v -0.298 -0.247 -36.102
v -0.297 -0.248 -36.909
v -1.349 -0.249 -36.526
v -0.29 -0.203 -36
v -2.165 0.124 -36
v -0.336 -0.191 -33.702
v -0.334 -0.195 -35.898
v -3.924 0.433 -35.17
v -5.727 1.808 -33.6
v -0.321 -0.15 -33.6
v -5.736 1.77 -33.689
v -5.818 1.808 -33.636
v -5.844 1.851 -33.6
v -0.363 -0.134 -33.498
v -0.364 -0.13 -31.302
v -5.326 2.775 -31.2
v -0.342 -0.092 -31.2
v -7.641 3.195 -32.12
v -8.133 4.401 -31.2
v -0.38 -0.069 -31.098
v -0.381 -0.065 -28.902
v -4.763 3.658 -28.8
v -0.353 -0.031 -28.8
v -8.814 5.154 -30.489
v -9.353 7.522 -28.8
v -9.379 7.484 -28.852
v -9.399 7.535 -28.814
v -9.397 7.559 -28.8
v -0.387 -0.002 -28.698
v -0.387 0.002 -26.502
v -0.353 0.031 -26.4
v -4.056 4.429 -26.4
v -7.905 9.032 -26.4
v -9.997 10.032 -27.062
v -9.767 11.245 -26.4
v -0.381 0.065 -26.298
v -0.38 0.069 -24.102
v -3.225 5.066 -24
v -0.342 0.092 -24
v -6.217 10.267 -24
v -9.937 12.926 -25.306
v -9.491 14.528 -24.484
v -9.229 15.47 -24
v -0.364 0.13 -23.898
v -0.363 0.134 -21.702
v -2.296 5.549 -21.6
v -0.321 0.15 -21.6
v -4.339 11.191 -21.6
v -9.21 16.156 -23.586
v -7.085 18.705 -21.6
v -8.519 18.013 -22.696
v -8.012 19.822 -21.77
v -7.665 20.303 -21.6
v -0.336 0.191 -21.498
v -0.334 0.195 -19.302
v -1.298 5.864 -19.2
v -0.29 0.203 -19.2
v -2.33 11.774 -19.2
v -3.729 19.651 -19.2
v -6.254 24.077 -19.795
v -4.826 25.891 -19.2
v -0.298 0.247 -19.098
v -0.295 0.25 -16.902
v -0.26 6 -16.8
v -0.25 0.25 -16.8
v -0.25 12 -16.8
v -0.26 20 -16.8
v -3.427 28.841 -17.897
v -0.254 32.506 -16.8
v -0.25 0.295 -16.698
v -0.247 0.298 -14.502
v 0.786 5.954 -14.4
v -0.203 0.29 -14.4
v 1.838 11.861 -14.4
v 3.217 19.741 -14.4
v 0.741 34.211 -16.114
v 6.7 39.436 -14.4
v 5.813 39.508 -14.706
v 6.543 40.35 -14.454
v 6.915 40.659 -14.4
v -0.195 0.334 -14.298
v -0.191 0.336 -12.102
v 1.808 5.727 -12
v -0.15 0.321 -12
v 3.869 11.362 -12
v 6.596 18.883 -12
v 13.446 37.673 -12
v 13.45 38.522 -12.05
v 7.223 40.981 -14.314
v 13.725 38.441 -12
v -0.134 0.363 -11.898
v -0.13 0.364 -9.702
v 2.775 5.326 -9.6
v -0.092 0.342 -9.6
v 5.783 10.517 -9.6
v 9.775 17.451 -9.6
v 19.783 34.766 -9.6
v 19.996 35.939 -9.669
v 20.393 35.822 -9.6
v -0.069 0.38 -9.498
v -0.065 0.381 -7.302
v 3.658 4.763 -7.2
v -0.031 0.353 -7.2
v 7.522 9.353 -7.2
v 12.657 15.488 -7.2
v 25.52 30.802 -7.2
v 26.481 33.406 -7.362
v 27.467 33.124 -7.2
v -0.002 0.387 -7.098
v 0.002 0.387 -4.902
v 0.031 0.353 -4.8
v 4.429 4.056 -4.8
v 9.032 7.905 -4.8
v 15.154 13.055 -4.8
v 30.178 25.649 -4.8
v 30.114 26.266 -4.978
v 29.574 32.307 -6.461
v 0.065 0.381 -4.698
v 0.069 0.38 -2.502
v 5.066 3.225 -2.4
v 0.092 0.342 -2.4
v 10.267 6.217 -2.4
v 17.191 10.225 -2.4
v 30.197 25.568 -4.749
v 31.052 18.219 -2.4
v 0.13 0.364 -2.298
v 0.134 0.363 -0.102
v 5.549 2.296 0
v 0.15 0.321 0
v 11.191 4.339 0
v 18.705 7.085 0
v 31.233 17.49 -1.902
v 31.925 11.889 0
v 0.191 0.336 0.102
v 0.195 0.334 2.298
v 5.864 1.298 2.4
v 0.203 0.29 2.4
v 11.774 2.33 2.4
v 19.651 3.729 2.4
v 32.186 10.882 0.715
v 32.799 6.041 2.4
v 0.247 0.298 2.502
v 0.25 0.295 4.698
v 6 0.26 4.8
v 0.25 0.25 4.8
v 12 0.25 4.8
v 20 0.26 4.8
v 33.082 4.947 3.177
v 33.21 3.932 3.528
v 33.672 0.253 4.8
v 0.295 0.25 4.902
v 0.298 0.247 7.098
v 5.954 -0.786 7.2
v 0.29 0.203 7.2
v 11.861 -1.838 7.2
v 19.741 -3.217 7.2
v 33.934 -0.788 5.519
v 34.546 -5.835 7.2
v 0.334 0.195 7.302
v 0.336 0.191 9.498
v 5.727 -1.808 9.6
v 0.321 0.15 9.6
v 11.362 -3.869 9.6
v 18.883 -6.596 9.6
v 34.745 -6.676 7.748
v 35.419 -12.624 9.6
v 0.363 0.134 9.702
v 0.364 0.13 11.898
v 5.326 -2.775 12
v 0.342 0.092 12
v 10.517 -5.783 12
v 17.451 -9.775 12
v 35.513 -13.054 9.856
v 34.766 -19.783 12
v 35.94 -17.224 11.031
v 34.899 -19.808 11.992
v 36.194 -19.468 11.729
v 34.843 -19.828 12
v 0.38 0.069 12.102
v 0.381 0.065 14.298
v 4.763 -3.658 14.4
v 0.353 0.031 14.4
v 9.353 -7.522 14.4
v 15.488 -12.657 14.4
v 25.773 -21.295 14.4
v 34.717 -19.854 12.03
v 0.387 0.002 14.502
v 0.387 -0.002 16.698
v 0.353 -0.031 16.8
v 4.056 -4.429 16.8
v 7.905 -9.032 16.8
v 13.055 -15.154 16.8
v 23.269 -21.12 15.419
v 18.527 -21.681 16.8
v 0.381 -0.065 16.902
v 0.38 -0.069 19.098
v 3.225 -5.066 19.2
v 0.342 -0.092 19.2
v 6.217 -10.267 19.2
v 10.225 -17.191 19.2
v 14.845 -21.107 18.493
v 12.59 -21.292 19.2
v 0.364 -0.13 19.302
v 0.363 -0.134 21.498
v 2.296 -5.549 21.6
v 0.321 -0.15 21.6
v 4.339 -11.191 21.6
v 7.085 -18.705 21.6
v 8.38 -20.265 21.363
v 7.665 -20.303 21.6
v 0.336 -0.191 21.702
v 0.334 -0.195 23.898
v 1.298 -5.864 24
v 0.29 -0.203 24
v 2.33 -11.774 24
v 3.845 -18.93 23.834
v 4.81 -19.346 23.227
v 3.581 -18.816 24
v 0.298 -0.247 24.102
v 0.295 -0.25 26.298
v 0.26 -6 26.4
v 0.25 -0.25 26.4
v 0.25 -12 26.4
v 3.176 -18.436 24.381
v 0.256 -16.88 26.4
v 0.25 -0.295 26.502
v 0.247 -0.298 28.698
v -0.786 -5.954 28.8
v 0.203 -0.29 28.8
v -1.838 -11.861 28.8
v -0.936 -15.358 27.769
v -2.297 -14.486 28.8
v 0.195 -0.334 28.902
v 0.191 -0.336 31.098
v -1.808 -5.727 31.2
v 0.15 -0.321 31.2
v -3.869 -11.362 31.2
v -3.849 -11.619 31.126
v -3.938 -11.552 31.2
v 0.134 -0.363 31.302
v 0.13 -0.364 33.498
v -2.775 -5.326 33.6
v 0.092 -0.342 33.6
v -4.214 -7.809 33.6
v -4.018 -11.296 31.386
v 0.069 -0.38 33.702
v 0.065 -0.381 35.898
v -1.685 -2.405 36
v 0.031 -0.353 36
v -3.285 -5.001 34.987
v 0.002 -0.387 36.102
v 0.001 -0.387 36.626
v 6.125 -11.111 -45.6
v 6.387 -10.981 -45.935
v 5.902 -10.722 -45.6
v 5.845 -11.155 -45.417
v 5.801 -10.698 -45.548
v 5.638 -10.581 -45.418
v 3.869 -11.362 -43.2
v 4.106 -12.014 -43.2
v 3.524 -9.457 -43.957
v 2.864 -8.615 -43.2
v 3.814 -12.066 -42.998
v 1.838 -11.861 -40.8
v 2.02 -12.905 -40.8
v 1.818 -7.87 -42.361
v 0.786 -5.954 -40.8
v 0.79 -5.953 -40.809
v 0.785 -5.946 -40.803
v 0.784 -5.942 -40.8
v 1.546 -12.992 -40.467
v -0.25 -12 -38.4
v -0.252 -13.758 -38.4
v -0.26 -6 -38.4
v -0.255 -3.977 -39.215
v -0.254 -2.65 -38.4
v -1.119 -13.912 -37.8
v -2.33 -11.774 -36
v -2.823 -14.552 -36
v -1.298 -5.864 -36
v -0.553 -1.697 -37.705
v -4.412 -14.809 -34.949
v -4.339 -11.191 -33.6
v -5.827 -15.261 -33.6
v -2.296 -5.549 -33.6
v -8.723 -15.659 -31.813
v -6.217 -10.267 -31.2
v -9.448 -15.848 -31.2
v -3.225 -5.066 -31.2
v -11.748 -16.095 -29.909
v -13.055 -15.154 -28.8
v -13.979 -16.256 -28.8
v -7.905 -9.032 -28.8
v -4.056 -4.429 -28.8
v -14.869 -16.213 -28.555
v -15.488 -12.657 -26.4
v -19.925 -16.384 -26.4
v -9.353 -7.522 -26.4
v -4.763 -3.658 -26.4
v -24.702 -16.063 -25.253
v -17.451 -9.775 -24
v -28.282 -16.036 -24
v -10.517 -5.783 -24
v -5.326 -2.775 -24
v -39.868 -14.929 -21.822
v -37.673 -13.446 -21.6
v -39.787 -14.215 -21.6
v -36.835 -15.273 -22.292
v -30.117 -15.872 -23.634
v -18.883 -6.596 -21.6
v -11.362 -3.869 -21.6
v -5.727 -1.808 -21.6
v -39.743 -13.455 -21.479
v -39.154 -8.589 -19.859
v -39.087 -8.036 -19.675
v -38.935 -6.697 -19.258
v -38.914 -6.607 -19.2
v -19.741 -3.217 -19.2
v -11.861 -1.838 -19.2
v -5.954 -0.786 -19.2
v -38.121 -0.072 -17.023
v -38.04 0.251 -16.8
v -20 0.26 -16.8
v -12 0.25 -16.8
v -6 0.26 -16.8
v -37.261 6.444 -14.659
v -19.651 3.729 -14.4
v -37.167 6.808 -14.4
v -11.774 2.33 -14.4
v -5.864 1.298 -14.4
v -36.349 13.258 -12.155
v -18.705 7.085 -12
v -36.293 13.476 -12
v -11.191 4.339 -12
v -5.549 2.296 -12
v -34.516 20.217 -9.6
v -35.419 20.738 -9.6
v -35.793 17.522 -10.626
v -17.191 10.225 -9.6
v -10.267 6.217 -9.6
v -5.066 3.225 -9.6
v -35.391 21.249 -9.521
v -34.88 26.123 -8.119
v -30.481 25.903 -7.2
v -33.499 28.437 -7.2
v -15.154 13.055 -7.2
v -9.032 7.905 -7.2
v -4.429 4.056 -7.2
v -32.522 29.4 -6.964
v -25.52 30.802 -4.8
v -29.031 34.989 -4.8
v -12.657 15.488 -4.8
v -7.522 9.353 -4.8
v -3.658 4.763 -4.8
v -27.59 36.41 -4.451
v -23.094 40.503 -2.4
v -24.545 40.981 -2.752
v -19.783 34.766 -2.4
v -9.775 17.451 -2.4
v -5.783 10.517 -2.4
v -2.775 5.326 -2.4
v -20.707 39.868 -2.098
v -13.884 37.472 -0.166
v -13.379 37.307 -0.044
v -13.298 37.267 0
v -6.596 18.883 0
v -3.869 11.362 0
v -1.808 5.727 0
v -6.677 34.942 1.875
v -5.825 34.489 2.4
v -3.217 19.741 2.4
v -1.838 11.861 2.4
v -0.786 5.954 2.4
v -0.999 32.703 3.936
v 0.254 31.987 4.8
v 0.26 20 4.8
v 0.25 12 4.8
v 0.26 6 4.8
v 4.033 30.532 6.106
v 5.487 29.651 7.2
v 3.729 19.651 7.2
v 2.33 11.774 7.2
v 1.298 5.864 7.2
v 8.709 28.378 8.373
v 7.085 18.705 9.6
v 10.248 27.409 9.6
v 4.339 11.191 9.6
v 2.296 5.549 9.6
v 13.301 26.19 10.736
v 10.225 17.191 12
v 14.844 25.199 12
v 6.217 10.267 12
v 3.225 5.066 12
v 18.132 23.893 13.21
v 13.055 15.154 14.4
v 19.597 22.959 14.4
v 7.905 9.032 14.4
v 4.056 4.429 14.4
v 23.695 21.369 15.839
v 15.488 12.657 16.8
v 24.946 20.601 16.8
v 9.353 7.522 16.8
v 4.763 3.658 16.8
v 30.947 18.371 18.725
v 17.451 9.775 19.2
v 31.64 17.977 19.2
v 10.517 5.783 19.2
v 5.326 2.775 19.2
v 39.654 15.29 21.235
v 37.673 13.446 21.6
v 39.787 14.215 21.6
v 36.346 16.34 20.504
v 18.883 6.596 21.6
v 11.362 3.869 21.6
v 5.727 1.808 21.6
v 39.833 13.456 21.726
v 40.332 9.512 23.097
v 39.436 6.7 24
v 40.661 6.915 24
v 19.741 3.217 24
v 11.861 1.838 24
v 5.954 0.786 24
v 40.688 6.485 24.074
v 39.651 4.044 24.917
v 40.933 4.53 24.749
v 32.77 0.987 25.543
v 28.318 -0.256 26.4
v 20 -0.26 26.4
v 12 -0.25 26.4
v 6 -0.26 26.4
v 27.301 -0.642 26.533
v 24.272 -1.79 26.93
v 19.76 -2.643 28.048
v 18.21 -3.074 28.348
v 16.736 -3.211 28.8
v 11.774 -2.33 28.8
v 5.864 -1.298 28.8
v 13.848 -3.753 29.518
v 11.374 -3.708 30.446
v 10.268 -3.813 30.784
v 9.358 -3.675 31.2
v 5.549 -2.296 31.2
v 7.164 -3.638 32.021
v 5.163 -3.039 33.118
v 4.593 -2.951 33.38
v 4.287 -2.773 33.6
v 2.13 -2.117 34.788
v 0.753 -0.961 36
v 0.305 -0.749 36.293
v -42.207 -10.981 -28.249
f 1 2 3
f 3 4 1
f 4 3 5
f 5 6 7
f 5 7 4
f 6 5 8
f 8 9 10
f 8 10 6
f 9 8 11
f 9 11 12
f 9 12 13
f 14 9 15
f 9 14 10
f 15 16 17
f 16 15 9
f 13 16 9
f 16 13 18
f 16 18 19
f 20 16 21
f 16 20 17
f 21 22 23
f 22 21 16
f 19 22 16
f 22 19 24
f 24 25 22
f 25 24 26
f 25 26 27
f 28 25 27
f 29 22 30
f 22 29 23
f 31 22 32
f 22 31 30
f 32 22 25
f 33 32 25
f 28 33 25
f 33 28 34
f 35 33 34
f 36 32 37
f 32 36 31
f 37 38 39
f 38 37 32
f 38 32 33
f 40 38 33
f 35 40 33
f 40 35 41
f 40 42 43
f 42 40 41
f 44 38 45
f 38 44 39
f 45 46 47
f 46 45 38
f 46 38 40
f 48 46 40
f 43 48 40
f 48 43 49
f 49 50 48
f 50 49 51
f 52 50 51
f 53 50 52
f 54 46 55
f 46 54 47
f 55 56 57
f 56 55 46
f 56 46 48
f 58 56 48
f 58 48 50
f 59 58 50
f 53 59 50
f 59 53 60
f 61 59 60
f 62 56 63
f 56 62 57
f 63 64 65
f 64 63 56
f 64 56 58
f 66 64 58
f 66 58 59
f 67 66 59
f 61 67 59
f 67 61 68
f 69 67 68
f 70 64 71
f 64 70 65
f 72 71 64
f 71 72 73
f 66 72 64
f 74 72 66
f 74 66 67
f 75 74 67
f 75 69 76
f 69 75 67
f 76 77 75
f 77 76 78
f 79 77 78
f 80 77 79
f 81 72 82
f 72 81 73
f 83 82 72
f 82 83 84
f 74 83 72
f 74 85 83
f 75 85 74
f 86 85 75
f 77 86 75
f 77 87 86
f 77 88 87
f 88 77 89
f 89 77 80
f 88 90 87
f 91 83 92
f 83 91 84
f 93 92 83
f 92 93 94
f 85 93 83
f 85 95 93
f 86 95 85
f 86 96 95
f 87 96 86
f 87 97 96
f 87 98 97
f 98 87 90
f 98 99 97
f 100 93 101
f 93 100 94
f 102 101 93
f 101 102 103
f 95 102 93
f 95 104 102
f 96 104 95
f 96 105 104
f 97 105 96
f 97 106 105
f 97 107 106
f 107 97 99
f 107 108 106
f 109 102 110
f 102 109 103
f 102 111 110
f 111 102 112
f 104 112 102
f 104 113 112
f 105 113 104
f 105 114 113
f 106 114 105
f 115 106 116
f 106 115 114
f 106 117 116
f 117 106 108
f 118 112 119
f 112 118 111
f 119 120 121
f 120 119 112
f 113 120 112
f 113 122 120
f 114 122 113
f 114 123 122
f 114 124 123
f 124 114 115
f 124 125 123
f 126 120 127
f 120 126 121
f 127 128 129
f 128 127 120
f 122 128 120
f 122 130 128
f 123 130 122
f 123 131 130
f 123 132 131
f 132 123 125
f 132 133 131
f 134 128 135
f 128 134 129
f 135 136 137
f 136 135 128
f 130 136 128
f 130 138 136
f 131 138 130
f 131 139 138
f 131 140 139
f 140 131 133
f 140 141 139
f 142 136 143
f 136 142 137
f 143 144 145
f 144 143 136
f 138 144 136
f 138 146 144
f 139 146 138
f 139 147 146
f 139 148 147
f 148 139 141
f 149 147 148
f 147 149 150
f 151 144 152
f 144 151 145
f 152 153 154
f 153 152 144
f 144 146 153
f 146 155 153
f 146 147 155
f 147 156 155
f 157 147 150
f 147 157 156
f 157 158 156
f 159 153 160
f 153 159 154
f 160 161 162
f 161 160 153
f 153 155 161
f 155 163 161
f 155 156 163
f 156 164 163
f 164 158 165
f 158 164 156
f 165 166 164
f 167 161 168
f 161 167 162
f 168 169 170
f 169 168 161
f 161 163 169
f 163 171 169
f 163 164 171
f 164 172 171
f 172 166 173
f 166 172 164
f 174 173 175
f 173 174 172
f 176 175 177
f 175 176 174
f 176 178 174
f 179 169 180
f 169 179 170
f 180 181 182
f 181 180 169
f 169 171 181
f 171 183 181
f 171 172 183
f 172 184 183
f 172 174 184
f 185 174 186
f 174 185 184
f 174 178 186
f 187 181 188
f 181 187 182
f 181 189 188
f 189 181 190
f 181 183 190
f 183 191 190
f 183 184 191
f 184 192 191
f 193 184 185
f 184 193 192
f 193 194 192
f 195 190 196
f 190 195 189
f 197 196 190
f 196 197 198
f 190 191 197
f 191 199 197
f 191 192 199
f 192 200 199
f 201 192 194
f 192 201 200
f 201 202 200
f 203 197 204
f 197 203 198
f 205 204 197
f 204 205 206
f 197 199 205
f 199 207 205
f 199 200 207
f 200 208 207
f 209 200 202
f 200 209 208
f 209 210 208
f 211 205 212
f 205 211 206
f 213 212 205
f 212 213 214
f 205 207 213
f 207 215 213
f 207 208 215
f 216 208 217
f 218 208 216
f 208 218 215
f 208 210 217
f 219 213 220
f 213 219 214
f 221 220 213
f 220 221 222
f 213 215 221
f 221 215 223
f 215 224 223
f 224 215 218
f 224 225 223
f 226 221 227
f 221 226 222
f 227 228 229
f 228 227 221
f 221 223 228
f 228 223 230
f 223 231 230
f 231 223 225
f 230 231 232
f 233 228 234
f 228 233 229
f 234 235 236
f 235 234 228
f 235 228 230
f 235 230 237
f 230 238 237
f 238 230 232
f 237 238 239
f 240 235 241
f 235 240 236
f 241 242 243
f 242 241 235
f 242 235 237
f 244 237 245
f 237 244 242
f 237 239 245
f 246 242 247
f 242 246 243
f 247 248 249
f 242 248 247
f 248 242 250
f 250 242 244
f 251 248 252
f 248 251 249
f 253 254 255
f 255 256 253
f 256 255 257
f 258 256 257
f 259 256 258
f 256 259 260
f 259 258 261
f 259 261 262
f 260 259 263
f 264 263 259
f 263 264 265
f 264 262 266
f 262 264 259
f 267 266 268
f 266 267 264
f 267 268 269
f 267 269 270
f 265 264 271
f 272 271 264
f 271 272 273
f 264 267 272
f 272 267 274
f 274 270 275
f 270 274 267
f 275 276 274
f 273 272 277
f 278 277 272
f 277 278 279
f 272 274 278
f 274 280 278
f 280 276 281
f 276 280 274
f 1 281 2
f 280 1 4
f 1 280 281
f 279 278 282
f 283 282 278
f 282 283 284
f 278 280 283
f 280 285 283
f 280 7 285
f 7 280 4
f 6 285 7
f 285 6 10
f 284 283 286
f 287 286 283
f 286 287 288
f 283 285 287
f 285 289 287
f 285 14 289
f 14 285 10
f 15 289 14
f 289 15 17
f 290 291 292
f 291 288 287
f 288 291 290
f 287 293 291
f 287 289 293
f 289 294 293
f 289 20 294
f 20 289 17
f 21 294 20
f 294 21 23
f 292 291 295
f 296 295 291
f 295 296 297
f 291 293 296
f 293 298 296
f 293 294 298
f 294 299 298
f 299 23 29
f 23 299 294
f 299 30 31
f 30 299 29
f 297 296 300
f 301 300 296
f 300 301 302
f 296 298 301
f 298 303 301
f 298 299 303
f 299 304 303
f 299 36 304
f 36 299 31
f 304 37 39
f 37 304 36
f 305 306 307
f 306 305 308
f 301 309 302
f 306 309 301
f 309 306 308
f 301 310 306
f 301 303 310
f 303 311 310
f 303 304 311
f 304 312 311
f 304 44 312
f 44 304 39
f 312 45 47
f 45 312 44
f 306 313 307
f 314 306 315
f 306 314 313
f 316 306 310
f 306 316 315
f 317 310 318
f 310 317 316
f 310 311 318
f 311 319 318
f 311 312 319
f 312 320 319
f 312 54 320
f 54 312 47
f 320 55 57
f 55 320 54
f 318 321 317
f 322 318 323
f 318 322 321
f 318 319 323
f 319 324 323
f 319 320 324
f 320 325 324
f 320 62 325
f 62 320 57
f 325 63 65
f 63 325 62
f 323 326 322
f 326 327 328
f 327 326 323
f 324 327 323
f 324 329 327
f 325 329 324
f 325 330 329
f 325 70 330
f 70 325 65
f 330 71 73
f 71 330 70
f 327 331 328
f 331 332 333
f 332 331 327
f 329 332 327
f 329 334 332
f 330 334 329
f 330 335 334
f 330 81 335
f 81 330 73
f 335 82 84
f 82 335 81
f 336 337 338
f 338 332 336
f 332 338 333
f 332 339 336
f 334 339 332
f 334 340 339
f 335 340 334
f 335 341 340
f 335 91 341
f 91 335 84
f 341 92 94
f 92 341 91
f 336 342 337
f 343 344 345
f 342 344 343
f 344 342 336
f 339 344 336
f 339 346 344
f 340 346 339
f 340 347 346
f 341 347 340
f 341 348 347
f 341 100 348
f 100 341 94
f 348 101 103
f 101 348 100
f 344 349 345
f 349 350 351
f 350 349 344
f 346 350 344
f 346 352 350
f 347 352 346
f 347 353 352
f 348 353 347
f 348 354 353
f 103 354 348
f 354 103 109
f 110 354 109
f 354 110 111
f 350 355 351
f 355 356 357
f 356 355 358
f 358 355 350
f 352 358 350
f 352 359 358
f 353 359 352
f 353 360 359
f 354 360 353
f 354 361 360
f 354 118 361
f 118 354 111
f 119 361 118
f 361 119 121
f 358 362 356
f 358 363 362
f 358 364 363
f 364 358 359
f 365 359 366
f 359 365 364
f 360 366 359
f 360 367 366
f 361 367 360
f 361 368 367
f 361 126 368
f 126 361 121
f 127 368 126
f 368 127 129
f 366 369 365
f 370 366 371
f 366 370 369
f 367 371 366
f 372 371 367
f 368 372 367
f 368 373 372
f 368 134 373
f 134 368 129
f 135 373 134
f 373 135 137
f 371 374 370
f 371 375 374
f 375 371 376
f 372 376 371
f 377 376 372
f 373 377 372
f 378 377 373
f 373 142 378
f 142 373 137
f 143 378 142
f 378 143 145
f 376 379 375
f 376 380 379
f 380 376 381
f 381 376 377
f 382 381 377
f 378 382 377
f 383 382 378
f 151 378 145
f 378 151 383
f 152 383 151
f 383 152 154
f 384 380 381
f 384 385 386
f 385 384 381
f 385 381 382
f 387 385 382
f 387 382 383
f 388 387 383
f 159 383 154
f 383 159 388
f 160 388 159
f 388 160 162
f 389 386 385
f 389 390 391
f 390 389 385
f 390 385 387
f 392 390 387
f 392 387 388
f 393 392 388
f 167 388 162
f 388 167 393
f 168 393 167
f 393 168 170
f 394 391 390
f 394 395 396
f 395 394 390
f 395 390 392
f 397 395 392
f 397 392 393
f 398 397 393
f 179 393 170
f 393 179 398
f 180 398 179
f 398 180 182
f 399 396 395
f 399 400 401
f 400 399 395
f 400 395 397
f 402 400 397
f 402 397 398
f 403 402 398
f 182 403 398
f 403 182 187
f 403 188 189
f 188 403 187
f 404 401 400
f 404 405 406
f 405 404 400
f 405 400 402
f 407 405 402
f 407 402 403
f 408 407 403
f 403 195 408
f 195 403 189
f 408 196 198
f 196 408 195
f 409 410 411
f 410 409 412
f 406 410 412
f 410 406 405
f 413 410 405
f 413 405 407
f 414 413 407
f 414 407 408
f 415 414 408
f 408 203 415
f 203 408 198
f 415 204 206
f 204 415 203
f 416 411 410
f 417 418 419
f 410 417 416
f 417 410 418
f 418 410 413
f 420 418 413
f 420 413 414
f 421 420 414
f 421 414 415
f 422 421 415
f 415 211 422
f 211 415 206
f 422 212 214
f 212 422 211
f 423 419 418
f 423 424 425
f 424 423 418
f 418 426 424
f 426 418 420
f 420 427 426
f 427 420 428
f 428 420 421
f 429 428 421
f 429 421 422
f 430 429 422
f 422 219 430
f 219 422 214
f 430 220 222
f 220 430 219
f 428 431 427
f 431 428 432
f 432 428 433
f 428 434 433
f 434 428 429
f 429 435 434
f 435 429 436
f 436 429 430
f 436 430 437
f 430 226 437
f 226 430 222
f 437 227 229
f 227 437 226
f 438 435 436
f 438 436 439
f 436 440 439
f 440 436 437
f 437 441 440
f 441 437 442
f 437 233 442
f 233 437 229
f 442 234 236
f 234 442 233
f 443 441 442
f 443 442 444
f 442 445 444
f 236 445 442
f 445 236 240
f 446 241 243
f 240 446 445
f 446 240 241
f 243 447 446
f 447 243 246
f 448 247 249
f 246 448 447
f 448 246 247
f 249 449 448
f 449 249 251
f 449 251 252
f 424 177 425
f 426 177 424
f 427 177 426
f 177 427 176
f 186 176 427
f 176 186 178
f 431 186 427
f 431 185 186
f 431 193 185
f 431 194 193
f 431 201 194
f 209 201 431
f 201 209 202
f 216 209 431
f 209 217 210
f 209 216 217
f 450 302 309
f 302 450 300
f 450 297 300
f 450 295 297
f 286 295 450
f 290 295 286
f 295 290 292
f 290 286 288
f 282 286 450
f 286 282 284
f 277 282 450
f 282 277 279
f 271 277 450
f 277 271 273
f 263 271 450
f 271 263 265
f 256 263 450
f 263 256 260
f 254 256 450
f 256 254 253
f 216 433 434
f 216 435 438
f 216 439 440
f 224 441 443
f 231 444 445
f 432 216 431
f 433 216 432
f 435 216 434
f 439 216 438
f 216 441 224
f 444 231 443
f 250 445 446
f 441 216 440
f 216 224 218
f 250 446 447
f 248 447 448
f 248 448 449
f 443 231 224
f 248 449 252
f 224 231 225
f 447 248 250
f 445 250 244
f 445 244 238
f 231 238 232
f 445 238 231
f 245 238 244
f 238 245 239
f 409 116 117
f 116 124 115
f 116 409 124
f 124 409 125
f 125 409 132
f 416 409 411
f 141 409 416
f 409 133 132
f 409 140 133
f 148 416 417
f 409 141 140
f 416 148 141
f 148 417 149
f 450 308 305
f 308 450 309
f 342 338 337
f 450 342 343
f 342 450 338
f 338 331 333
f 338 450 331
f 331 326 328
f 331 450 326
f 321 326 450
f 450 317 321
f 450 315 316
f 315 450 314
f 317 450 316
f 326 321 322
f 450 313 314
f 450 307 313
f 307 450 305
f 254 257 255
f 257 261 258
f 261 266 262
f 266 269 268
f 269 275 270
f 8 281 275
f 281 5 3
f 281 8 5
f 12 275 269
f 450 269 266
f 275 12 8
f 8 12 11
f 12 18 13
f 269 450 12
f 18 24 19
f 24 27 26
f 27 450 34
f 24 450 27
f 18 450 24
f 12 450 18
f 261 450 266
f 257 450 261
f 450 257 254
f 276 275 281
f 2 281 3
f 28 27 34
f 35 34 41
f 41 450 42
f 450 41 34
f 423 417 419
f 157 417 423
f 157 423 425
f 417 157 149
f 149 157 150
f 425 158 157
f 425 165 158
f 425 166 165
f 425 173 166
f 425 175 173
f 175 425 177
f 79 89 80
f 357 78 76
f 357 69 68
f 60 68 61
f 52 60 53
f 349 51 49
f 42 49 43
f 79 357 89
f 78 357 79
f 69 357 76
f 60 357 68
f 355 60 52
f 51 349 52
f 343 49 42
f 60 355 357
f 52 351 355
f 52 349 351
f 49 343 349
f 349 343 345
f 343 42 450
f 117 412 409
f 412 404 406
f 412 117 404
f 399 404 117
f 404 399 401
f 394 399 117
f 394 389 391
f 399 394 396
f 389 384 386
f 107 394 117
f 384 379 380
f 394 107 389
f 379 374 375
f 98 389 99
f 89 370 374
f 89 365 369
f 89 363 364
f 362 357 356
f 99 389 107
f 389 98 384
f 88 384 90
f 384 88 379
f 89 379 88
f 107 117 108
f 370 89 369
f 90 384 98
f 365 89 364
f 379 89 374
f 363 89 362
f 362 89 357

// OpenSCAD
// file: ../HelixMod.scad
module half_cylinder_helix (
    height, twist, slices, radius, nb,
    jeu = 0.1,
    zz=0.01)
{
    steps = [-3/2, -1, -2/3, -1/3, -1/6, -1/10, -1/20, 0,
    	     1/20, 1/10, 1/6, 1/3, 2/3, 1, 3/2];
    shape = concat([for (i = [0:1:len(steps)-1])
			     [steps[i]*radius, jeu + zz * ((i % 2 == 0) ? 1 : 0)]],
		   [[3/2*radius, 3/2*radius+jeu],[-3/2*radius, 3/2*radius+jeu]]);

    intersection() {
	 linear_extrude(height=height, twist=twist, slices=slices, convexity=6) {
	      polygon(points=shape);
	 }
	 cylinder(h = height, r = radius, $fn=nb);
    }
}

half_cylinder_helix (40, 360, 20, radius=40, nb = 16, jeu=0.1);

module quarter_cylinder_helix (
    height, twist, slices, radius, nb,
    jeu = 0.1,
    zz=0.01)
{
     intersection() {
	  half_cylinder_helix(height, twist, slices, radius, nb, jeu, zz);
	  rotate([0,0,-90])
	  half_cylinder_helix(height, twist, slices, radius, nb, jeu, zz);
     }
};

color([1,0,0]) translate([0,0,-40])
quarter_cylinder_helix (40, 360, 20, radius=40, nb = 16, jeu=0.1);
// main file
use <../HelixMod.scad>;

size = 60;
sl = 50;
jeu = 0.25;
rot = [30,20];

module draw_piece(i) {
    intersection(convexity=6)
    {
	rotate(rot) cube([size,size,size],center=true);
	rotate([0,0,90*i])
	     translate([0,0,-size])
	     quarter_cylinder_helix (height=(2*size),
				     twist=500,
				     slices= sl,
				     radius=(2*size), nb = 6, jeu=jeu);
    }
};

// for (i=[0:1:3]) # draw_piece(i);

draw_piece(3);
